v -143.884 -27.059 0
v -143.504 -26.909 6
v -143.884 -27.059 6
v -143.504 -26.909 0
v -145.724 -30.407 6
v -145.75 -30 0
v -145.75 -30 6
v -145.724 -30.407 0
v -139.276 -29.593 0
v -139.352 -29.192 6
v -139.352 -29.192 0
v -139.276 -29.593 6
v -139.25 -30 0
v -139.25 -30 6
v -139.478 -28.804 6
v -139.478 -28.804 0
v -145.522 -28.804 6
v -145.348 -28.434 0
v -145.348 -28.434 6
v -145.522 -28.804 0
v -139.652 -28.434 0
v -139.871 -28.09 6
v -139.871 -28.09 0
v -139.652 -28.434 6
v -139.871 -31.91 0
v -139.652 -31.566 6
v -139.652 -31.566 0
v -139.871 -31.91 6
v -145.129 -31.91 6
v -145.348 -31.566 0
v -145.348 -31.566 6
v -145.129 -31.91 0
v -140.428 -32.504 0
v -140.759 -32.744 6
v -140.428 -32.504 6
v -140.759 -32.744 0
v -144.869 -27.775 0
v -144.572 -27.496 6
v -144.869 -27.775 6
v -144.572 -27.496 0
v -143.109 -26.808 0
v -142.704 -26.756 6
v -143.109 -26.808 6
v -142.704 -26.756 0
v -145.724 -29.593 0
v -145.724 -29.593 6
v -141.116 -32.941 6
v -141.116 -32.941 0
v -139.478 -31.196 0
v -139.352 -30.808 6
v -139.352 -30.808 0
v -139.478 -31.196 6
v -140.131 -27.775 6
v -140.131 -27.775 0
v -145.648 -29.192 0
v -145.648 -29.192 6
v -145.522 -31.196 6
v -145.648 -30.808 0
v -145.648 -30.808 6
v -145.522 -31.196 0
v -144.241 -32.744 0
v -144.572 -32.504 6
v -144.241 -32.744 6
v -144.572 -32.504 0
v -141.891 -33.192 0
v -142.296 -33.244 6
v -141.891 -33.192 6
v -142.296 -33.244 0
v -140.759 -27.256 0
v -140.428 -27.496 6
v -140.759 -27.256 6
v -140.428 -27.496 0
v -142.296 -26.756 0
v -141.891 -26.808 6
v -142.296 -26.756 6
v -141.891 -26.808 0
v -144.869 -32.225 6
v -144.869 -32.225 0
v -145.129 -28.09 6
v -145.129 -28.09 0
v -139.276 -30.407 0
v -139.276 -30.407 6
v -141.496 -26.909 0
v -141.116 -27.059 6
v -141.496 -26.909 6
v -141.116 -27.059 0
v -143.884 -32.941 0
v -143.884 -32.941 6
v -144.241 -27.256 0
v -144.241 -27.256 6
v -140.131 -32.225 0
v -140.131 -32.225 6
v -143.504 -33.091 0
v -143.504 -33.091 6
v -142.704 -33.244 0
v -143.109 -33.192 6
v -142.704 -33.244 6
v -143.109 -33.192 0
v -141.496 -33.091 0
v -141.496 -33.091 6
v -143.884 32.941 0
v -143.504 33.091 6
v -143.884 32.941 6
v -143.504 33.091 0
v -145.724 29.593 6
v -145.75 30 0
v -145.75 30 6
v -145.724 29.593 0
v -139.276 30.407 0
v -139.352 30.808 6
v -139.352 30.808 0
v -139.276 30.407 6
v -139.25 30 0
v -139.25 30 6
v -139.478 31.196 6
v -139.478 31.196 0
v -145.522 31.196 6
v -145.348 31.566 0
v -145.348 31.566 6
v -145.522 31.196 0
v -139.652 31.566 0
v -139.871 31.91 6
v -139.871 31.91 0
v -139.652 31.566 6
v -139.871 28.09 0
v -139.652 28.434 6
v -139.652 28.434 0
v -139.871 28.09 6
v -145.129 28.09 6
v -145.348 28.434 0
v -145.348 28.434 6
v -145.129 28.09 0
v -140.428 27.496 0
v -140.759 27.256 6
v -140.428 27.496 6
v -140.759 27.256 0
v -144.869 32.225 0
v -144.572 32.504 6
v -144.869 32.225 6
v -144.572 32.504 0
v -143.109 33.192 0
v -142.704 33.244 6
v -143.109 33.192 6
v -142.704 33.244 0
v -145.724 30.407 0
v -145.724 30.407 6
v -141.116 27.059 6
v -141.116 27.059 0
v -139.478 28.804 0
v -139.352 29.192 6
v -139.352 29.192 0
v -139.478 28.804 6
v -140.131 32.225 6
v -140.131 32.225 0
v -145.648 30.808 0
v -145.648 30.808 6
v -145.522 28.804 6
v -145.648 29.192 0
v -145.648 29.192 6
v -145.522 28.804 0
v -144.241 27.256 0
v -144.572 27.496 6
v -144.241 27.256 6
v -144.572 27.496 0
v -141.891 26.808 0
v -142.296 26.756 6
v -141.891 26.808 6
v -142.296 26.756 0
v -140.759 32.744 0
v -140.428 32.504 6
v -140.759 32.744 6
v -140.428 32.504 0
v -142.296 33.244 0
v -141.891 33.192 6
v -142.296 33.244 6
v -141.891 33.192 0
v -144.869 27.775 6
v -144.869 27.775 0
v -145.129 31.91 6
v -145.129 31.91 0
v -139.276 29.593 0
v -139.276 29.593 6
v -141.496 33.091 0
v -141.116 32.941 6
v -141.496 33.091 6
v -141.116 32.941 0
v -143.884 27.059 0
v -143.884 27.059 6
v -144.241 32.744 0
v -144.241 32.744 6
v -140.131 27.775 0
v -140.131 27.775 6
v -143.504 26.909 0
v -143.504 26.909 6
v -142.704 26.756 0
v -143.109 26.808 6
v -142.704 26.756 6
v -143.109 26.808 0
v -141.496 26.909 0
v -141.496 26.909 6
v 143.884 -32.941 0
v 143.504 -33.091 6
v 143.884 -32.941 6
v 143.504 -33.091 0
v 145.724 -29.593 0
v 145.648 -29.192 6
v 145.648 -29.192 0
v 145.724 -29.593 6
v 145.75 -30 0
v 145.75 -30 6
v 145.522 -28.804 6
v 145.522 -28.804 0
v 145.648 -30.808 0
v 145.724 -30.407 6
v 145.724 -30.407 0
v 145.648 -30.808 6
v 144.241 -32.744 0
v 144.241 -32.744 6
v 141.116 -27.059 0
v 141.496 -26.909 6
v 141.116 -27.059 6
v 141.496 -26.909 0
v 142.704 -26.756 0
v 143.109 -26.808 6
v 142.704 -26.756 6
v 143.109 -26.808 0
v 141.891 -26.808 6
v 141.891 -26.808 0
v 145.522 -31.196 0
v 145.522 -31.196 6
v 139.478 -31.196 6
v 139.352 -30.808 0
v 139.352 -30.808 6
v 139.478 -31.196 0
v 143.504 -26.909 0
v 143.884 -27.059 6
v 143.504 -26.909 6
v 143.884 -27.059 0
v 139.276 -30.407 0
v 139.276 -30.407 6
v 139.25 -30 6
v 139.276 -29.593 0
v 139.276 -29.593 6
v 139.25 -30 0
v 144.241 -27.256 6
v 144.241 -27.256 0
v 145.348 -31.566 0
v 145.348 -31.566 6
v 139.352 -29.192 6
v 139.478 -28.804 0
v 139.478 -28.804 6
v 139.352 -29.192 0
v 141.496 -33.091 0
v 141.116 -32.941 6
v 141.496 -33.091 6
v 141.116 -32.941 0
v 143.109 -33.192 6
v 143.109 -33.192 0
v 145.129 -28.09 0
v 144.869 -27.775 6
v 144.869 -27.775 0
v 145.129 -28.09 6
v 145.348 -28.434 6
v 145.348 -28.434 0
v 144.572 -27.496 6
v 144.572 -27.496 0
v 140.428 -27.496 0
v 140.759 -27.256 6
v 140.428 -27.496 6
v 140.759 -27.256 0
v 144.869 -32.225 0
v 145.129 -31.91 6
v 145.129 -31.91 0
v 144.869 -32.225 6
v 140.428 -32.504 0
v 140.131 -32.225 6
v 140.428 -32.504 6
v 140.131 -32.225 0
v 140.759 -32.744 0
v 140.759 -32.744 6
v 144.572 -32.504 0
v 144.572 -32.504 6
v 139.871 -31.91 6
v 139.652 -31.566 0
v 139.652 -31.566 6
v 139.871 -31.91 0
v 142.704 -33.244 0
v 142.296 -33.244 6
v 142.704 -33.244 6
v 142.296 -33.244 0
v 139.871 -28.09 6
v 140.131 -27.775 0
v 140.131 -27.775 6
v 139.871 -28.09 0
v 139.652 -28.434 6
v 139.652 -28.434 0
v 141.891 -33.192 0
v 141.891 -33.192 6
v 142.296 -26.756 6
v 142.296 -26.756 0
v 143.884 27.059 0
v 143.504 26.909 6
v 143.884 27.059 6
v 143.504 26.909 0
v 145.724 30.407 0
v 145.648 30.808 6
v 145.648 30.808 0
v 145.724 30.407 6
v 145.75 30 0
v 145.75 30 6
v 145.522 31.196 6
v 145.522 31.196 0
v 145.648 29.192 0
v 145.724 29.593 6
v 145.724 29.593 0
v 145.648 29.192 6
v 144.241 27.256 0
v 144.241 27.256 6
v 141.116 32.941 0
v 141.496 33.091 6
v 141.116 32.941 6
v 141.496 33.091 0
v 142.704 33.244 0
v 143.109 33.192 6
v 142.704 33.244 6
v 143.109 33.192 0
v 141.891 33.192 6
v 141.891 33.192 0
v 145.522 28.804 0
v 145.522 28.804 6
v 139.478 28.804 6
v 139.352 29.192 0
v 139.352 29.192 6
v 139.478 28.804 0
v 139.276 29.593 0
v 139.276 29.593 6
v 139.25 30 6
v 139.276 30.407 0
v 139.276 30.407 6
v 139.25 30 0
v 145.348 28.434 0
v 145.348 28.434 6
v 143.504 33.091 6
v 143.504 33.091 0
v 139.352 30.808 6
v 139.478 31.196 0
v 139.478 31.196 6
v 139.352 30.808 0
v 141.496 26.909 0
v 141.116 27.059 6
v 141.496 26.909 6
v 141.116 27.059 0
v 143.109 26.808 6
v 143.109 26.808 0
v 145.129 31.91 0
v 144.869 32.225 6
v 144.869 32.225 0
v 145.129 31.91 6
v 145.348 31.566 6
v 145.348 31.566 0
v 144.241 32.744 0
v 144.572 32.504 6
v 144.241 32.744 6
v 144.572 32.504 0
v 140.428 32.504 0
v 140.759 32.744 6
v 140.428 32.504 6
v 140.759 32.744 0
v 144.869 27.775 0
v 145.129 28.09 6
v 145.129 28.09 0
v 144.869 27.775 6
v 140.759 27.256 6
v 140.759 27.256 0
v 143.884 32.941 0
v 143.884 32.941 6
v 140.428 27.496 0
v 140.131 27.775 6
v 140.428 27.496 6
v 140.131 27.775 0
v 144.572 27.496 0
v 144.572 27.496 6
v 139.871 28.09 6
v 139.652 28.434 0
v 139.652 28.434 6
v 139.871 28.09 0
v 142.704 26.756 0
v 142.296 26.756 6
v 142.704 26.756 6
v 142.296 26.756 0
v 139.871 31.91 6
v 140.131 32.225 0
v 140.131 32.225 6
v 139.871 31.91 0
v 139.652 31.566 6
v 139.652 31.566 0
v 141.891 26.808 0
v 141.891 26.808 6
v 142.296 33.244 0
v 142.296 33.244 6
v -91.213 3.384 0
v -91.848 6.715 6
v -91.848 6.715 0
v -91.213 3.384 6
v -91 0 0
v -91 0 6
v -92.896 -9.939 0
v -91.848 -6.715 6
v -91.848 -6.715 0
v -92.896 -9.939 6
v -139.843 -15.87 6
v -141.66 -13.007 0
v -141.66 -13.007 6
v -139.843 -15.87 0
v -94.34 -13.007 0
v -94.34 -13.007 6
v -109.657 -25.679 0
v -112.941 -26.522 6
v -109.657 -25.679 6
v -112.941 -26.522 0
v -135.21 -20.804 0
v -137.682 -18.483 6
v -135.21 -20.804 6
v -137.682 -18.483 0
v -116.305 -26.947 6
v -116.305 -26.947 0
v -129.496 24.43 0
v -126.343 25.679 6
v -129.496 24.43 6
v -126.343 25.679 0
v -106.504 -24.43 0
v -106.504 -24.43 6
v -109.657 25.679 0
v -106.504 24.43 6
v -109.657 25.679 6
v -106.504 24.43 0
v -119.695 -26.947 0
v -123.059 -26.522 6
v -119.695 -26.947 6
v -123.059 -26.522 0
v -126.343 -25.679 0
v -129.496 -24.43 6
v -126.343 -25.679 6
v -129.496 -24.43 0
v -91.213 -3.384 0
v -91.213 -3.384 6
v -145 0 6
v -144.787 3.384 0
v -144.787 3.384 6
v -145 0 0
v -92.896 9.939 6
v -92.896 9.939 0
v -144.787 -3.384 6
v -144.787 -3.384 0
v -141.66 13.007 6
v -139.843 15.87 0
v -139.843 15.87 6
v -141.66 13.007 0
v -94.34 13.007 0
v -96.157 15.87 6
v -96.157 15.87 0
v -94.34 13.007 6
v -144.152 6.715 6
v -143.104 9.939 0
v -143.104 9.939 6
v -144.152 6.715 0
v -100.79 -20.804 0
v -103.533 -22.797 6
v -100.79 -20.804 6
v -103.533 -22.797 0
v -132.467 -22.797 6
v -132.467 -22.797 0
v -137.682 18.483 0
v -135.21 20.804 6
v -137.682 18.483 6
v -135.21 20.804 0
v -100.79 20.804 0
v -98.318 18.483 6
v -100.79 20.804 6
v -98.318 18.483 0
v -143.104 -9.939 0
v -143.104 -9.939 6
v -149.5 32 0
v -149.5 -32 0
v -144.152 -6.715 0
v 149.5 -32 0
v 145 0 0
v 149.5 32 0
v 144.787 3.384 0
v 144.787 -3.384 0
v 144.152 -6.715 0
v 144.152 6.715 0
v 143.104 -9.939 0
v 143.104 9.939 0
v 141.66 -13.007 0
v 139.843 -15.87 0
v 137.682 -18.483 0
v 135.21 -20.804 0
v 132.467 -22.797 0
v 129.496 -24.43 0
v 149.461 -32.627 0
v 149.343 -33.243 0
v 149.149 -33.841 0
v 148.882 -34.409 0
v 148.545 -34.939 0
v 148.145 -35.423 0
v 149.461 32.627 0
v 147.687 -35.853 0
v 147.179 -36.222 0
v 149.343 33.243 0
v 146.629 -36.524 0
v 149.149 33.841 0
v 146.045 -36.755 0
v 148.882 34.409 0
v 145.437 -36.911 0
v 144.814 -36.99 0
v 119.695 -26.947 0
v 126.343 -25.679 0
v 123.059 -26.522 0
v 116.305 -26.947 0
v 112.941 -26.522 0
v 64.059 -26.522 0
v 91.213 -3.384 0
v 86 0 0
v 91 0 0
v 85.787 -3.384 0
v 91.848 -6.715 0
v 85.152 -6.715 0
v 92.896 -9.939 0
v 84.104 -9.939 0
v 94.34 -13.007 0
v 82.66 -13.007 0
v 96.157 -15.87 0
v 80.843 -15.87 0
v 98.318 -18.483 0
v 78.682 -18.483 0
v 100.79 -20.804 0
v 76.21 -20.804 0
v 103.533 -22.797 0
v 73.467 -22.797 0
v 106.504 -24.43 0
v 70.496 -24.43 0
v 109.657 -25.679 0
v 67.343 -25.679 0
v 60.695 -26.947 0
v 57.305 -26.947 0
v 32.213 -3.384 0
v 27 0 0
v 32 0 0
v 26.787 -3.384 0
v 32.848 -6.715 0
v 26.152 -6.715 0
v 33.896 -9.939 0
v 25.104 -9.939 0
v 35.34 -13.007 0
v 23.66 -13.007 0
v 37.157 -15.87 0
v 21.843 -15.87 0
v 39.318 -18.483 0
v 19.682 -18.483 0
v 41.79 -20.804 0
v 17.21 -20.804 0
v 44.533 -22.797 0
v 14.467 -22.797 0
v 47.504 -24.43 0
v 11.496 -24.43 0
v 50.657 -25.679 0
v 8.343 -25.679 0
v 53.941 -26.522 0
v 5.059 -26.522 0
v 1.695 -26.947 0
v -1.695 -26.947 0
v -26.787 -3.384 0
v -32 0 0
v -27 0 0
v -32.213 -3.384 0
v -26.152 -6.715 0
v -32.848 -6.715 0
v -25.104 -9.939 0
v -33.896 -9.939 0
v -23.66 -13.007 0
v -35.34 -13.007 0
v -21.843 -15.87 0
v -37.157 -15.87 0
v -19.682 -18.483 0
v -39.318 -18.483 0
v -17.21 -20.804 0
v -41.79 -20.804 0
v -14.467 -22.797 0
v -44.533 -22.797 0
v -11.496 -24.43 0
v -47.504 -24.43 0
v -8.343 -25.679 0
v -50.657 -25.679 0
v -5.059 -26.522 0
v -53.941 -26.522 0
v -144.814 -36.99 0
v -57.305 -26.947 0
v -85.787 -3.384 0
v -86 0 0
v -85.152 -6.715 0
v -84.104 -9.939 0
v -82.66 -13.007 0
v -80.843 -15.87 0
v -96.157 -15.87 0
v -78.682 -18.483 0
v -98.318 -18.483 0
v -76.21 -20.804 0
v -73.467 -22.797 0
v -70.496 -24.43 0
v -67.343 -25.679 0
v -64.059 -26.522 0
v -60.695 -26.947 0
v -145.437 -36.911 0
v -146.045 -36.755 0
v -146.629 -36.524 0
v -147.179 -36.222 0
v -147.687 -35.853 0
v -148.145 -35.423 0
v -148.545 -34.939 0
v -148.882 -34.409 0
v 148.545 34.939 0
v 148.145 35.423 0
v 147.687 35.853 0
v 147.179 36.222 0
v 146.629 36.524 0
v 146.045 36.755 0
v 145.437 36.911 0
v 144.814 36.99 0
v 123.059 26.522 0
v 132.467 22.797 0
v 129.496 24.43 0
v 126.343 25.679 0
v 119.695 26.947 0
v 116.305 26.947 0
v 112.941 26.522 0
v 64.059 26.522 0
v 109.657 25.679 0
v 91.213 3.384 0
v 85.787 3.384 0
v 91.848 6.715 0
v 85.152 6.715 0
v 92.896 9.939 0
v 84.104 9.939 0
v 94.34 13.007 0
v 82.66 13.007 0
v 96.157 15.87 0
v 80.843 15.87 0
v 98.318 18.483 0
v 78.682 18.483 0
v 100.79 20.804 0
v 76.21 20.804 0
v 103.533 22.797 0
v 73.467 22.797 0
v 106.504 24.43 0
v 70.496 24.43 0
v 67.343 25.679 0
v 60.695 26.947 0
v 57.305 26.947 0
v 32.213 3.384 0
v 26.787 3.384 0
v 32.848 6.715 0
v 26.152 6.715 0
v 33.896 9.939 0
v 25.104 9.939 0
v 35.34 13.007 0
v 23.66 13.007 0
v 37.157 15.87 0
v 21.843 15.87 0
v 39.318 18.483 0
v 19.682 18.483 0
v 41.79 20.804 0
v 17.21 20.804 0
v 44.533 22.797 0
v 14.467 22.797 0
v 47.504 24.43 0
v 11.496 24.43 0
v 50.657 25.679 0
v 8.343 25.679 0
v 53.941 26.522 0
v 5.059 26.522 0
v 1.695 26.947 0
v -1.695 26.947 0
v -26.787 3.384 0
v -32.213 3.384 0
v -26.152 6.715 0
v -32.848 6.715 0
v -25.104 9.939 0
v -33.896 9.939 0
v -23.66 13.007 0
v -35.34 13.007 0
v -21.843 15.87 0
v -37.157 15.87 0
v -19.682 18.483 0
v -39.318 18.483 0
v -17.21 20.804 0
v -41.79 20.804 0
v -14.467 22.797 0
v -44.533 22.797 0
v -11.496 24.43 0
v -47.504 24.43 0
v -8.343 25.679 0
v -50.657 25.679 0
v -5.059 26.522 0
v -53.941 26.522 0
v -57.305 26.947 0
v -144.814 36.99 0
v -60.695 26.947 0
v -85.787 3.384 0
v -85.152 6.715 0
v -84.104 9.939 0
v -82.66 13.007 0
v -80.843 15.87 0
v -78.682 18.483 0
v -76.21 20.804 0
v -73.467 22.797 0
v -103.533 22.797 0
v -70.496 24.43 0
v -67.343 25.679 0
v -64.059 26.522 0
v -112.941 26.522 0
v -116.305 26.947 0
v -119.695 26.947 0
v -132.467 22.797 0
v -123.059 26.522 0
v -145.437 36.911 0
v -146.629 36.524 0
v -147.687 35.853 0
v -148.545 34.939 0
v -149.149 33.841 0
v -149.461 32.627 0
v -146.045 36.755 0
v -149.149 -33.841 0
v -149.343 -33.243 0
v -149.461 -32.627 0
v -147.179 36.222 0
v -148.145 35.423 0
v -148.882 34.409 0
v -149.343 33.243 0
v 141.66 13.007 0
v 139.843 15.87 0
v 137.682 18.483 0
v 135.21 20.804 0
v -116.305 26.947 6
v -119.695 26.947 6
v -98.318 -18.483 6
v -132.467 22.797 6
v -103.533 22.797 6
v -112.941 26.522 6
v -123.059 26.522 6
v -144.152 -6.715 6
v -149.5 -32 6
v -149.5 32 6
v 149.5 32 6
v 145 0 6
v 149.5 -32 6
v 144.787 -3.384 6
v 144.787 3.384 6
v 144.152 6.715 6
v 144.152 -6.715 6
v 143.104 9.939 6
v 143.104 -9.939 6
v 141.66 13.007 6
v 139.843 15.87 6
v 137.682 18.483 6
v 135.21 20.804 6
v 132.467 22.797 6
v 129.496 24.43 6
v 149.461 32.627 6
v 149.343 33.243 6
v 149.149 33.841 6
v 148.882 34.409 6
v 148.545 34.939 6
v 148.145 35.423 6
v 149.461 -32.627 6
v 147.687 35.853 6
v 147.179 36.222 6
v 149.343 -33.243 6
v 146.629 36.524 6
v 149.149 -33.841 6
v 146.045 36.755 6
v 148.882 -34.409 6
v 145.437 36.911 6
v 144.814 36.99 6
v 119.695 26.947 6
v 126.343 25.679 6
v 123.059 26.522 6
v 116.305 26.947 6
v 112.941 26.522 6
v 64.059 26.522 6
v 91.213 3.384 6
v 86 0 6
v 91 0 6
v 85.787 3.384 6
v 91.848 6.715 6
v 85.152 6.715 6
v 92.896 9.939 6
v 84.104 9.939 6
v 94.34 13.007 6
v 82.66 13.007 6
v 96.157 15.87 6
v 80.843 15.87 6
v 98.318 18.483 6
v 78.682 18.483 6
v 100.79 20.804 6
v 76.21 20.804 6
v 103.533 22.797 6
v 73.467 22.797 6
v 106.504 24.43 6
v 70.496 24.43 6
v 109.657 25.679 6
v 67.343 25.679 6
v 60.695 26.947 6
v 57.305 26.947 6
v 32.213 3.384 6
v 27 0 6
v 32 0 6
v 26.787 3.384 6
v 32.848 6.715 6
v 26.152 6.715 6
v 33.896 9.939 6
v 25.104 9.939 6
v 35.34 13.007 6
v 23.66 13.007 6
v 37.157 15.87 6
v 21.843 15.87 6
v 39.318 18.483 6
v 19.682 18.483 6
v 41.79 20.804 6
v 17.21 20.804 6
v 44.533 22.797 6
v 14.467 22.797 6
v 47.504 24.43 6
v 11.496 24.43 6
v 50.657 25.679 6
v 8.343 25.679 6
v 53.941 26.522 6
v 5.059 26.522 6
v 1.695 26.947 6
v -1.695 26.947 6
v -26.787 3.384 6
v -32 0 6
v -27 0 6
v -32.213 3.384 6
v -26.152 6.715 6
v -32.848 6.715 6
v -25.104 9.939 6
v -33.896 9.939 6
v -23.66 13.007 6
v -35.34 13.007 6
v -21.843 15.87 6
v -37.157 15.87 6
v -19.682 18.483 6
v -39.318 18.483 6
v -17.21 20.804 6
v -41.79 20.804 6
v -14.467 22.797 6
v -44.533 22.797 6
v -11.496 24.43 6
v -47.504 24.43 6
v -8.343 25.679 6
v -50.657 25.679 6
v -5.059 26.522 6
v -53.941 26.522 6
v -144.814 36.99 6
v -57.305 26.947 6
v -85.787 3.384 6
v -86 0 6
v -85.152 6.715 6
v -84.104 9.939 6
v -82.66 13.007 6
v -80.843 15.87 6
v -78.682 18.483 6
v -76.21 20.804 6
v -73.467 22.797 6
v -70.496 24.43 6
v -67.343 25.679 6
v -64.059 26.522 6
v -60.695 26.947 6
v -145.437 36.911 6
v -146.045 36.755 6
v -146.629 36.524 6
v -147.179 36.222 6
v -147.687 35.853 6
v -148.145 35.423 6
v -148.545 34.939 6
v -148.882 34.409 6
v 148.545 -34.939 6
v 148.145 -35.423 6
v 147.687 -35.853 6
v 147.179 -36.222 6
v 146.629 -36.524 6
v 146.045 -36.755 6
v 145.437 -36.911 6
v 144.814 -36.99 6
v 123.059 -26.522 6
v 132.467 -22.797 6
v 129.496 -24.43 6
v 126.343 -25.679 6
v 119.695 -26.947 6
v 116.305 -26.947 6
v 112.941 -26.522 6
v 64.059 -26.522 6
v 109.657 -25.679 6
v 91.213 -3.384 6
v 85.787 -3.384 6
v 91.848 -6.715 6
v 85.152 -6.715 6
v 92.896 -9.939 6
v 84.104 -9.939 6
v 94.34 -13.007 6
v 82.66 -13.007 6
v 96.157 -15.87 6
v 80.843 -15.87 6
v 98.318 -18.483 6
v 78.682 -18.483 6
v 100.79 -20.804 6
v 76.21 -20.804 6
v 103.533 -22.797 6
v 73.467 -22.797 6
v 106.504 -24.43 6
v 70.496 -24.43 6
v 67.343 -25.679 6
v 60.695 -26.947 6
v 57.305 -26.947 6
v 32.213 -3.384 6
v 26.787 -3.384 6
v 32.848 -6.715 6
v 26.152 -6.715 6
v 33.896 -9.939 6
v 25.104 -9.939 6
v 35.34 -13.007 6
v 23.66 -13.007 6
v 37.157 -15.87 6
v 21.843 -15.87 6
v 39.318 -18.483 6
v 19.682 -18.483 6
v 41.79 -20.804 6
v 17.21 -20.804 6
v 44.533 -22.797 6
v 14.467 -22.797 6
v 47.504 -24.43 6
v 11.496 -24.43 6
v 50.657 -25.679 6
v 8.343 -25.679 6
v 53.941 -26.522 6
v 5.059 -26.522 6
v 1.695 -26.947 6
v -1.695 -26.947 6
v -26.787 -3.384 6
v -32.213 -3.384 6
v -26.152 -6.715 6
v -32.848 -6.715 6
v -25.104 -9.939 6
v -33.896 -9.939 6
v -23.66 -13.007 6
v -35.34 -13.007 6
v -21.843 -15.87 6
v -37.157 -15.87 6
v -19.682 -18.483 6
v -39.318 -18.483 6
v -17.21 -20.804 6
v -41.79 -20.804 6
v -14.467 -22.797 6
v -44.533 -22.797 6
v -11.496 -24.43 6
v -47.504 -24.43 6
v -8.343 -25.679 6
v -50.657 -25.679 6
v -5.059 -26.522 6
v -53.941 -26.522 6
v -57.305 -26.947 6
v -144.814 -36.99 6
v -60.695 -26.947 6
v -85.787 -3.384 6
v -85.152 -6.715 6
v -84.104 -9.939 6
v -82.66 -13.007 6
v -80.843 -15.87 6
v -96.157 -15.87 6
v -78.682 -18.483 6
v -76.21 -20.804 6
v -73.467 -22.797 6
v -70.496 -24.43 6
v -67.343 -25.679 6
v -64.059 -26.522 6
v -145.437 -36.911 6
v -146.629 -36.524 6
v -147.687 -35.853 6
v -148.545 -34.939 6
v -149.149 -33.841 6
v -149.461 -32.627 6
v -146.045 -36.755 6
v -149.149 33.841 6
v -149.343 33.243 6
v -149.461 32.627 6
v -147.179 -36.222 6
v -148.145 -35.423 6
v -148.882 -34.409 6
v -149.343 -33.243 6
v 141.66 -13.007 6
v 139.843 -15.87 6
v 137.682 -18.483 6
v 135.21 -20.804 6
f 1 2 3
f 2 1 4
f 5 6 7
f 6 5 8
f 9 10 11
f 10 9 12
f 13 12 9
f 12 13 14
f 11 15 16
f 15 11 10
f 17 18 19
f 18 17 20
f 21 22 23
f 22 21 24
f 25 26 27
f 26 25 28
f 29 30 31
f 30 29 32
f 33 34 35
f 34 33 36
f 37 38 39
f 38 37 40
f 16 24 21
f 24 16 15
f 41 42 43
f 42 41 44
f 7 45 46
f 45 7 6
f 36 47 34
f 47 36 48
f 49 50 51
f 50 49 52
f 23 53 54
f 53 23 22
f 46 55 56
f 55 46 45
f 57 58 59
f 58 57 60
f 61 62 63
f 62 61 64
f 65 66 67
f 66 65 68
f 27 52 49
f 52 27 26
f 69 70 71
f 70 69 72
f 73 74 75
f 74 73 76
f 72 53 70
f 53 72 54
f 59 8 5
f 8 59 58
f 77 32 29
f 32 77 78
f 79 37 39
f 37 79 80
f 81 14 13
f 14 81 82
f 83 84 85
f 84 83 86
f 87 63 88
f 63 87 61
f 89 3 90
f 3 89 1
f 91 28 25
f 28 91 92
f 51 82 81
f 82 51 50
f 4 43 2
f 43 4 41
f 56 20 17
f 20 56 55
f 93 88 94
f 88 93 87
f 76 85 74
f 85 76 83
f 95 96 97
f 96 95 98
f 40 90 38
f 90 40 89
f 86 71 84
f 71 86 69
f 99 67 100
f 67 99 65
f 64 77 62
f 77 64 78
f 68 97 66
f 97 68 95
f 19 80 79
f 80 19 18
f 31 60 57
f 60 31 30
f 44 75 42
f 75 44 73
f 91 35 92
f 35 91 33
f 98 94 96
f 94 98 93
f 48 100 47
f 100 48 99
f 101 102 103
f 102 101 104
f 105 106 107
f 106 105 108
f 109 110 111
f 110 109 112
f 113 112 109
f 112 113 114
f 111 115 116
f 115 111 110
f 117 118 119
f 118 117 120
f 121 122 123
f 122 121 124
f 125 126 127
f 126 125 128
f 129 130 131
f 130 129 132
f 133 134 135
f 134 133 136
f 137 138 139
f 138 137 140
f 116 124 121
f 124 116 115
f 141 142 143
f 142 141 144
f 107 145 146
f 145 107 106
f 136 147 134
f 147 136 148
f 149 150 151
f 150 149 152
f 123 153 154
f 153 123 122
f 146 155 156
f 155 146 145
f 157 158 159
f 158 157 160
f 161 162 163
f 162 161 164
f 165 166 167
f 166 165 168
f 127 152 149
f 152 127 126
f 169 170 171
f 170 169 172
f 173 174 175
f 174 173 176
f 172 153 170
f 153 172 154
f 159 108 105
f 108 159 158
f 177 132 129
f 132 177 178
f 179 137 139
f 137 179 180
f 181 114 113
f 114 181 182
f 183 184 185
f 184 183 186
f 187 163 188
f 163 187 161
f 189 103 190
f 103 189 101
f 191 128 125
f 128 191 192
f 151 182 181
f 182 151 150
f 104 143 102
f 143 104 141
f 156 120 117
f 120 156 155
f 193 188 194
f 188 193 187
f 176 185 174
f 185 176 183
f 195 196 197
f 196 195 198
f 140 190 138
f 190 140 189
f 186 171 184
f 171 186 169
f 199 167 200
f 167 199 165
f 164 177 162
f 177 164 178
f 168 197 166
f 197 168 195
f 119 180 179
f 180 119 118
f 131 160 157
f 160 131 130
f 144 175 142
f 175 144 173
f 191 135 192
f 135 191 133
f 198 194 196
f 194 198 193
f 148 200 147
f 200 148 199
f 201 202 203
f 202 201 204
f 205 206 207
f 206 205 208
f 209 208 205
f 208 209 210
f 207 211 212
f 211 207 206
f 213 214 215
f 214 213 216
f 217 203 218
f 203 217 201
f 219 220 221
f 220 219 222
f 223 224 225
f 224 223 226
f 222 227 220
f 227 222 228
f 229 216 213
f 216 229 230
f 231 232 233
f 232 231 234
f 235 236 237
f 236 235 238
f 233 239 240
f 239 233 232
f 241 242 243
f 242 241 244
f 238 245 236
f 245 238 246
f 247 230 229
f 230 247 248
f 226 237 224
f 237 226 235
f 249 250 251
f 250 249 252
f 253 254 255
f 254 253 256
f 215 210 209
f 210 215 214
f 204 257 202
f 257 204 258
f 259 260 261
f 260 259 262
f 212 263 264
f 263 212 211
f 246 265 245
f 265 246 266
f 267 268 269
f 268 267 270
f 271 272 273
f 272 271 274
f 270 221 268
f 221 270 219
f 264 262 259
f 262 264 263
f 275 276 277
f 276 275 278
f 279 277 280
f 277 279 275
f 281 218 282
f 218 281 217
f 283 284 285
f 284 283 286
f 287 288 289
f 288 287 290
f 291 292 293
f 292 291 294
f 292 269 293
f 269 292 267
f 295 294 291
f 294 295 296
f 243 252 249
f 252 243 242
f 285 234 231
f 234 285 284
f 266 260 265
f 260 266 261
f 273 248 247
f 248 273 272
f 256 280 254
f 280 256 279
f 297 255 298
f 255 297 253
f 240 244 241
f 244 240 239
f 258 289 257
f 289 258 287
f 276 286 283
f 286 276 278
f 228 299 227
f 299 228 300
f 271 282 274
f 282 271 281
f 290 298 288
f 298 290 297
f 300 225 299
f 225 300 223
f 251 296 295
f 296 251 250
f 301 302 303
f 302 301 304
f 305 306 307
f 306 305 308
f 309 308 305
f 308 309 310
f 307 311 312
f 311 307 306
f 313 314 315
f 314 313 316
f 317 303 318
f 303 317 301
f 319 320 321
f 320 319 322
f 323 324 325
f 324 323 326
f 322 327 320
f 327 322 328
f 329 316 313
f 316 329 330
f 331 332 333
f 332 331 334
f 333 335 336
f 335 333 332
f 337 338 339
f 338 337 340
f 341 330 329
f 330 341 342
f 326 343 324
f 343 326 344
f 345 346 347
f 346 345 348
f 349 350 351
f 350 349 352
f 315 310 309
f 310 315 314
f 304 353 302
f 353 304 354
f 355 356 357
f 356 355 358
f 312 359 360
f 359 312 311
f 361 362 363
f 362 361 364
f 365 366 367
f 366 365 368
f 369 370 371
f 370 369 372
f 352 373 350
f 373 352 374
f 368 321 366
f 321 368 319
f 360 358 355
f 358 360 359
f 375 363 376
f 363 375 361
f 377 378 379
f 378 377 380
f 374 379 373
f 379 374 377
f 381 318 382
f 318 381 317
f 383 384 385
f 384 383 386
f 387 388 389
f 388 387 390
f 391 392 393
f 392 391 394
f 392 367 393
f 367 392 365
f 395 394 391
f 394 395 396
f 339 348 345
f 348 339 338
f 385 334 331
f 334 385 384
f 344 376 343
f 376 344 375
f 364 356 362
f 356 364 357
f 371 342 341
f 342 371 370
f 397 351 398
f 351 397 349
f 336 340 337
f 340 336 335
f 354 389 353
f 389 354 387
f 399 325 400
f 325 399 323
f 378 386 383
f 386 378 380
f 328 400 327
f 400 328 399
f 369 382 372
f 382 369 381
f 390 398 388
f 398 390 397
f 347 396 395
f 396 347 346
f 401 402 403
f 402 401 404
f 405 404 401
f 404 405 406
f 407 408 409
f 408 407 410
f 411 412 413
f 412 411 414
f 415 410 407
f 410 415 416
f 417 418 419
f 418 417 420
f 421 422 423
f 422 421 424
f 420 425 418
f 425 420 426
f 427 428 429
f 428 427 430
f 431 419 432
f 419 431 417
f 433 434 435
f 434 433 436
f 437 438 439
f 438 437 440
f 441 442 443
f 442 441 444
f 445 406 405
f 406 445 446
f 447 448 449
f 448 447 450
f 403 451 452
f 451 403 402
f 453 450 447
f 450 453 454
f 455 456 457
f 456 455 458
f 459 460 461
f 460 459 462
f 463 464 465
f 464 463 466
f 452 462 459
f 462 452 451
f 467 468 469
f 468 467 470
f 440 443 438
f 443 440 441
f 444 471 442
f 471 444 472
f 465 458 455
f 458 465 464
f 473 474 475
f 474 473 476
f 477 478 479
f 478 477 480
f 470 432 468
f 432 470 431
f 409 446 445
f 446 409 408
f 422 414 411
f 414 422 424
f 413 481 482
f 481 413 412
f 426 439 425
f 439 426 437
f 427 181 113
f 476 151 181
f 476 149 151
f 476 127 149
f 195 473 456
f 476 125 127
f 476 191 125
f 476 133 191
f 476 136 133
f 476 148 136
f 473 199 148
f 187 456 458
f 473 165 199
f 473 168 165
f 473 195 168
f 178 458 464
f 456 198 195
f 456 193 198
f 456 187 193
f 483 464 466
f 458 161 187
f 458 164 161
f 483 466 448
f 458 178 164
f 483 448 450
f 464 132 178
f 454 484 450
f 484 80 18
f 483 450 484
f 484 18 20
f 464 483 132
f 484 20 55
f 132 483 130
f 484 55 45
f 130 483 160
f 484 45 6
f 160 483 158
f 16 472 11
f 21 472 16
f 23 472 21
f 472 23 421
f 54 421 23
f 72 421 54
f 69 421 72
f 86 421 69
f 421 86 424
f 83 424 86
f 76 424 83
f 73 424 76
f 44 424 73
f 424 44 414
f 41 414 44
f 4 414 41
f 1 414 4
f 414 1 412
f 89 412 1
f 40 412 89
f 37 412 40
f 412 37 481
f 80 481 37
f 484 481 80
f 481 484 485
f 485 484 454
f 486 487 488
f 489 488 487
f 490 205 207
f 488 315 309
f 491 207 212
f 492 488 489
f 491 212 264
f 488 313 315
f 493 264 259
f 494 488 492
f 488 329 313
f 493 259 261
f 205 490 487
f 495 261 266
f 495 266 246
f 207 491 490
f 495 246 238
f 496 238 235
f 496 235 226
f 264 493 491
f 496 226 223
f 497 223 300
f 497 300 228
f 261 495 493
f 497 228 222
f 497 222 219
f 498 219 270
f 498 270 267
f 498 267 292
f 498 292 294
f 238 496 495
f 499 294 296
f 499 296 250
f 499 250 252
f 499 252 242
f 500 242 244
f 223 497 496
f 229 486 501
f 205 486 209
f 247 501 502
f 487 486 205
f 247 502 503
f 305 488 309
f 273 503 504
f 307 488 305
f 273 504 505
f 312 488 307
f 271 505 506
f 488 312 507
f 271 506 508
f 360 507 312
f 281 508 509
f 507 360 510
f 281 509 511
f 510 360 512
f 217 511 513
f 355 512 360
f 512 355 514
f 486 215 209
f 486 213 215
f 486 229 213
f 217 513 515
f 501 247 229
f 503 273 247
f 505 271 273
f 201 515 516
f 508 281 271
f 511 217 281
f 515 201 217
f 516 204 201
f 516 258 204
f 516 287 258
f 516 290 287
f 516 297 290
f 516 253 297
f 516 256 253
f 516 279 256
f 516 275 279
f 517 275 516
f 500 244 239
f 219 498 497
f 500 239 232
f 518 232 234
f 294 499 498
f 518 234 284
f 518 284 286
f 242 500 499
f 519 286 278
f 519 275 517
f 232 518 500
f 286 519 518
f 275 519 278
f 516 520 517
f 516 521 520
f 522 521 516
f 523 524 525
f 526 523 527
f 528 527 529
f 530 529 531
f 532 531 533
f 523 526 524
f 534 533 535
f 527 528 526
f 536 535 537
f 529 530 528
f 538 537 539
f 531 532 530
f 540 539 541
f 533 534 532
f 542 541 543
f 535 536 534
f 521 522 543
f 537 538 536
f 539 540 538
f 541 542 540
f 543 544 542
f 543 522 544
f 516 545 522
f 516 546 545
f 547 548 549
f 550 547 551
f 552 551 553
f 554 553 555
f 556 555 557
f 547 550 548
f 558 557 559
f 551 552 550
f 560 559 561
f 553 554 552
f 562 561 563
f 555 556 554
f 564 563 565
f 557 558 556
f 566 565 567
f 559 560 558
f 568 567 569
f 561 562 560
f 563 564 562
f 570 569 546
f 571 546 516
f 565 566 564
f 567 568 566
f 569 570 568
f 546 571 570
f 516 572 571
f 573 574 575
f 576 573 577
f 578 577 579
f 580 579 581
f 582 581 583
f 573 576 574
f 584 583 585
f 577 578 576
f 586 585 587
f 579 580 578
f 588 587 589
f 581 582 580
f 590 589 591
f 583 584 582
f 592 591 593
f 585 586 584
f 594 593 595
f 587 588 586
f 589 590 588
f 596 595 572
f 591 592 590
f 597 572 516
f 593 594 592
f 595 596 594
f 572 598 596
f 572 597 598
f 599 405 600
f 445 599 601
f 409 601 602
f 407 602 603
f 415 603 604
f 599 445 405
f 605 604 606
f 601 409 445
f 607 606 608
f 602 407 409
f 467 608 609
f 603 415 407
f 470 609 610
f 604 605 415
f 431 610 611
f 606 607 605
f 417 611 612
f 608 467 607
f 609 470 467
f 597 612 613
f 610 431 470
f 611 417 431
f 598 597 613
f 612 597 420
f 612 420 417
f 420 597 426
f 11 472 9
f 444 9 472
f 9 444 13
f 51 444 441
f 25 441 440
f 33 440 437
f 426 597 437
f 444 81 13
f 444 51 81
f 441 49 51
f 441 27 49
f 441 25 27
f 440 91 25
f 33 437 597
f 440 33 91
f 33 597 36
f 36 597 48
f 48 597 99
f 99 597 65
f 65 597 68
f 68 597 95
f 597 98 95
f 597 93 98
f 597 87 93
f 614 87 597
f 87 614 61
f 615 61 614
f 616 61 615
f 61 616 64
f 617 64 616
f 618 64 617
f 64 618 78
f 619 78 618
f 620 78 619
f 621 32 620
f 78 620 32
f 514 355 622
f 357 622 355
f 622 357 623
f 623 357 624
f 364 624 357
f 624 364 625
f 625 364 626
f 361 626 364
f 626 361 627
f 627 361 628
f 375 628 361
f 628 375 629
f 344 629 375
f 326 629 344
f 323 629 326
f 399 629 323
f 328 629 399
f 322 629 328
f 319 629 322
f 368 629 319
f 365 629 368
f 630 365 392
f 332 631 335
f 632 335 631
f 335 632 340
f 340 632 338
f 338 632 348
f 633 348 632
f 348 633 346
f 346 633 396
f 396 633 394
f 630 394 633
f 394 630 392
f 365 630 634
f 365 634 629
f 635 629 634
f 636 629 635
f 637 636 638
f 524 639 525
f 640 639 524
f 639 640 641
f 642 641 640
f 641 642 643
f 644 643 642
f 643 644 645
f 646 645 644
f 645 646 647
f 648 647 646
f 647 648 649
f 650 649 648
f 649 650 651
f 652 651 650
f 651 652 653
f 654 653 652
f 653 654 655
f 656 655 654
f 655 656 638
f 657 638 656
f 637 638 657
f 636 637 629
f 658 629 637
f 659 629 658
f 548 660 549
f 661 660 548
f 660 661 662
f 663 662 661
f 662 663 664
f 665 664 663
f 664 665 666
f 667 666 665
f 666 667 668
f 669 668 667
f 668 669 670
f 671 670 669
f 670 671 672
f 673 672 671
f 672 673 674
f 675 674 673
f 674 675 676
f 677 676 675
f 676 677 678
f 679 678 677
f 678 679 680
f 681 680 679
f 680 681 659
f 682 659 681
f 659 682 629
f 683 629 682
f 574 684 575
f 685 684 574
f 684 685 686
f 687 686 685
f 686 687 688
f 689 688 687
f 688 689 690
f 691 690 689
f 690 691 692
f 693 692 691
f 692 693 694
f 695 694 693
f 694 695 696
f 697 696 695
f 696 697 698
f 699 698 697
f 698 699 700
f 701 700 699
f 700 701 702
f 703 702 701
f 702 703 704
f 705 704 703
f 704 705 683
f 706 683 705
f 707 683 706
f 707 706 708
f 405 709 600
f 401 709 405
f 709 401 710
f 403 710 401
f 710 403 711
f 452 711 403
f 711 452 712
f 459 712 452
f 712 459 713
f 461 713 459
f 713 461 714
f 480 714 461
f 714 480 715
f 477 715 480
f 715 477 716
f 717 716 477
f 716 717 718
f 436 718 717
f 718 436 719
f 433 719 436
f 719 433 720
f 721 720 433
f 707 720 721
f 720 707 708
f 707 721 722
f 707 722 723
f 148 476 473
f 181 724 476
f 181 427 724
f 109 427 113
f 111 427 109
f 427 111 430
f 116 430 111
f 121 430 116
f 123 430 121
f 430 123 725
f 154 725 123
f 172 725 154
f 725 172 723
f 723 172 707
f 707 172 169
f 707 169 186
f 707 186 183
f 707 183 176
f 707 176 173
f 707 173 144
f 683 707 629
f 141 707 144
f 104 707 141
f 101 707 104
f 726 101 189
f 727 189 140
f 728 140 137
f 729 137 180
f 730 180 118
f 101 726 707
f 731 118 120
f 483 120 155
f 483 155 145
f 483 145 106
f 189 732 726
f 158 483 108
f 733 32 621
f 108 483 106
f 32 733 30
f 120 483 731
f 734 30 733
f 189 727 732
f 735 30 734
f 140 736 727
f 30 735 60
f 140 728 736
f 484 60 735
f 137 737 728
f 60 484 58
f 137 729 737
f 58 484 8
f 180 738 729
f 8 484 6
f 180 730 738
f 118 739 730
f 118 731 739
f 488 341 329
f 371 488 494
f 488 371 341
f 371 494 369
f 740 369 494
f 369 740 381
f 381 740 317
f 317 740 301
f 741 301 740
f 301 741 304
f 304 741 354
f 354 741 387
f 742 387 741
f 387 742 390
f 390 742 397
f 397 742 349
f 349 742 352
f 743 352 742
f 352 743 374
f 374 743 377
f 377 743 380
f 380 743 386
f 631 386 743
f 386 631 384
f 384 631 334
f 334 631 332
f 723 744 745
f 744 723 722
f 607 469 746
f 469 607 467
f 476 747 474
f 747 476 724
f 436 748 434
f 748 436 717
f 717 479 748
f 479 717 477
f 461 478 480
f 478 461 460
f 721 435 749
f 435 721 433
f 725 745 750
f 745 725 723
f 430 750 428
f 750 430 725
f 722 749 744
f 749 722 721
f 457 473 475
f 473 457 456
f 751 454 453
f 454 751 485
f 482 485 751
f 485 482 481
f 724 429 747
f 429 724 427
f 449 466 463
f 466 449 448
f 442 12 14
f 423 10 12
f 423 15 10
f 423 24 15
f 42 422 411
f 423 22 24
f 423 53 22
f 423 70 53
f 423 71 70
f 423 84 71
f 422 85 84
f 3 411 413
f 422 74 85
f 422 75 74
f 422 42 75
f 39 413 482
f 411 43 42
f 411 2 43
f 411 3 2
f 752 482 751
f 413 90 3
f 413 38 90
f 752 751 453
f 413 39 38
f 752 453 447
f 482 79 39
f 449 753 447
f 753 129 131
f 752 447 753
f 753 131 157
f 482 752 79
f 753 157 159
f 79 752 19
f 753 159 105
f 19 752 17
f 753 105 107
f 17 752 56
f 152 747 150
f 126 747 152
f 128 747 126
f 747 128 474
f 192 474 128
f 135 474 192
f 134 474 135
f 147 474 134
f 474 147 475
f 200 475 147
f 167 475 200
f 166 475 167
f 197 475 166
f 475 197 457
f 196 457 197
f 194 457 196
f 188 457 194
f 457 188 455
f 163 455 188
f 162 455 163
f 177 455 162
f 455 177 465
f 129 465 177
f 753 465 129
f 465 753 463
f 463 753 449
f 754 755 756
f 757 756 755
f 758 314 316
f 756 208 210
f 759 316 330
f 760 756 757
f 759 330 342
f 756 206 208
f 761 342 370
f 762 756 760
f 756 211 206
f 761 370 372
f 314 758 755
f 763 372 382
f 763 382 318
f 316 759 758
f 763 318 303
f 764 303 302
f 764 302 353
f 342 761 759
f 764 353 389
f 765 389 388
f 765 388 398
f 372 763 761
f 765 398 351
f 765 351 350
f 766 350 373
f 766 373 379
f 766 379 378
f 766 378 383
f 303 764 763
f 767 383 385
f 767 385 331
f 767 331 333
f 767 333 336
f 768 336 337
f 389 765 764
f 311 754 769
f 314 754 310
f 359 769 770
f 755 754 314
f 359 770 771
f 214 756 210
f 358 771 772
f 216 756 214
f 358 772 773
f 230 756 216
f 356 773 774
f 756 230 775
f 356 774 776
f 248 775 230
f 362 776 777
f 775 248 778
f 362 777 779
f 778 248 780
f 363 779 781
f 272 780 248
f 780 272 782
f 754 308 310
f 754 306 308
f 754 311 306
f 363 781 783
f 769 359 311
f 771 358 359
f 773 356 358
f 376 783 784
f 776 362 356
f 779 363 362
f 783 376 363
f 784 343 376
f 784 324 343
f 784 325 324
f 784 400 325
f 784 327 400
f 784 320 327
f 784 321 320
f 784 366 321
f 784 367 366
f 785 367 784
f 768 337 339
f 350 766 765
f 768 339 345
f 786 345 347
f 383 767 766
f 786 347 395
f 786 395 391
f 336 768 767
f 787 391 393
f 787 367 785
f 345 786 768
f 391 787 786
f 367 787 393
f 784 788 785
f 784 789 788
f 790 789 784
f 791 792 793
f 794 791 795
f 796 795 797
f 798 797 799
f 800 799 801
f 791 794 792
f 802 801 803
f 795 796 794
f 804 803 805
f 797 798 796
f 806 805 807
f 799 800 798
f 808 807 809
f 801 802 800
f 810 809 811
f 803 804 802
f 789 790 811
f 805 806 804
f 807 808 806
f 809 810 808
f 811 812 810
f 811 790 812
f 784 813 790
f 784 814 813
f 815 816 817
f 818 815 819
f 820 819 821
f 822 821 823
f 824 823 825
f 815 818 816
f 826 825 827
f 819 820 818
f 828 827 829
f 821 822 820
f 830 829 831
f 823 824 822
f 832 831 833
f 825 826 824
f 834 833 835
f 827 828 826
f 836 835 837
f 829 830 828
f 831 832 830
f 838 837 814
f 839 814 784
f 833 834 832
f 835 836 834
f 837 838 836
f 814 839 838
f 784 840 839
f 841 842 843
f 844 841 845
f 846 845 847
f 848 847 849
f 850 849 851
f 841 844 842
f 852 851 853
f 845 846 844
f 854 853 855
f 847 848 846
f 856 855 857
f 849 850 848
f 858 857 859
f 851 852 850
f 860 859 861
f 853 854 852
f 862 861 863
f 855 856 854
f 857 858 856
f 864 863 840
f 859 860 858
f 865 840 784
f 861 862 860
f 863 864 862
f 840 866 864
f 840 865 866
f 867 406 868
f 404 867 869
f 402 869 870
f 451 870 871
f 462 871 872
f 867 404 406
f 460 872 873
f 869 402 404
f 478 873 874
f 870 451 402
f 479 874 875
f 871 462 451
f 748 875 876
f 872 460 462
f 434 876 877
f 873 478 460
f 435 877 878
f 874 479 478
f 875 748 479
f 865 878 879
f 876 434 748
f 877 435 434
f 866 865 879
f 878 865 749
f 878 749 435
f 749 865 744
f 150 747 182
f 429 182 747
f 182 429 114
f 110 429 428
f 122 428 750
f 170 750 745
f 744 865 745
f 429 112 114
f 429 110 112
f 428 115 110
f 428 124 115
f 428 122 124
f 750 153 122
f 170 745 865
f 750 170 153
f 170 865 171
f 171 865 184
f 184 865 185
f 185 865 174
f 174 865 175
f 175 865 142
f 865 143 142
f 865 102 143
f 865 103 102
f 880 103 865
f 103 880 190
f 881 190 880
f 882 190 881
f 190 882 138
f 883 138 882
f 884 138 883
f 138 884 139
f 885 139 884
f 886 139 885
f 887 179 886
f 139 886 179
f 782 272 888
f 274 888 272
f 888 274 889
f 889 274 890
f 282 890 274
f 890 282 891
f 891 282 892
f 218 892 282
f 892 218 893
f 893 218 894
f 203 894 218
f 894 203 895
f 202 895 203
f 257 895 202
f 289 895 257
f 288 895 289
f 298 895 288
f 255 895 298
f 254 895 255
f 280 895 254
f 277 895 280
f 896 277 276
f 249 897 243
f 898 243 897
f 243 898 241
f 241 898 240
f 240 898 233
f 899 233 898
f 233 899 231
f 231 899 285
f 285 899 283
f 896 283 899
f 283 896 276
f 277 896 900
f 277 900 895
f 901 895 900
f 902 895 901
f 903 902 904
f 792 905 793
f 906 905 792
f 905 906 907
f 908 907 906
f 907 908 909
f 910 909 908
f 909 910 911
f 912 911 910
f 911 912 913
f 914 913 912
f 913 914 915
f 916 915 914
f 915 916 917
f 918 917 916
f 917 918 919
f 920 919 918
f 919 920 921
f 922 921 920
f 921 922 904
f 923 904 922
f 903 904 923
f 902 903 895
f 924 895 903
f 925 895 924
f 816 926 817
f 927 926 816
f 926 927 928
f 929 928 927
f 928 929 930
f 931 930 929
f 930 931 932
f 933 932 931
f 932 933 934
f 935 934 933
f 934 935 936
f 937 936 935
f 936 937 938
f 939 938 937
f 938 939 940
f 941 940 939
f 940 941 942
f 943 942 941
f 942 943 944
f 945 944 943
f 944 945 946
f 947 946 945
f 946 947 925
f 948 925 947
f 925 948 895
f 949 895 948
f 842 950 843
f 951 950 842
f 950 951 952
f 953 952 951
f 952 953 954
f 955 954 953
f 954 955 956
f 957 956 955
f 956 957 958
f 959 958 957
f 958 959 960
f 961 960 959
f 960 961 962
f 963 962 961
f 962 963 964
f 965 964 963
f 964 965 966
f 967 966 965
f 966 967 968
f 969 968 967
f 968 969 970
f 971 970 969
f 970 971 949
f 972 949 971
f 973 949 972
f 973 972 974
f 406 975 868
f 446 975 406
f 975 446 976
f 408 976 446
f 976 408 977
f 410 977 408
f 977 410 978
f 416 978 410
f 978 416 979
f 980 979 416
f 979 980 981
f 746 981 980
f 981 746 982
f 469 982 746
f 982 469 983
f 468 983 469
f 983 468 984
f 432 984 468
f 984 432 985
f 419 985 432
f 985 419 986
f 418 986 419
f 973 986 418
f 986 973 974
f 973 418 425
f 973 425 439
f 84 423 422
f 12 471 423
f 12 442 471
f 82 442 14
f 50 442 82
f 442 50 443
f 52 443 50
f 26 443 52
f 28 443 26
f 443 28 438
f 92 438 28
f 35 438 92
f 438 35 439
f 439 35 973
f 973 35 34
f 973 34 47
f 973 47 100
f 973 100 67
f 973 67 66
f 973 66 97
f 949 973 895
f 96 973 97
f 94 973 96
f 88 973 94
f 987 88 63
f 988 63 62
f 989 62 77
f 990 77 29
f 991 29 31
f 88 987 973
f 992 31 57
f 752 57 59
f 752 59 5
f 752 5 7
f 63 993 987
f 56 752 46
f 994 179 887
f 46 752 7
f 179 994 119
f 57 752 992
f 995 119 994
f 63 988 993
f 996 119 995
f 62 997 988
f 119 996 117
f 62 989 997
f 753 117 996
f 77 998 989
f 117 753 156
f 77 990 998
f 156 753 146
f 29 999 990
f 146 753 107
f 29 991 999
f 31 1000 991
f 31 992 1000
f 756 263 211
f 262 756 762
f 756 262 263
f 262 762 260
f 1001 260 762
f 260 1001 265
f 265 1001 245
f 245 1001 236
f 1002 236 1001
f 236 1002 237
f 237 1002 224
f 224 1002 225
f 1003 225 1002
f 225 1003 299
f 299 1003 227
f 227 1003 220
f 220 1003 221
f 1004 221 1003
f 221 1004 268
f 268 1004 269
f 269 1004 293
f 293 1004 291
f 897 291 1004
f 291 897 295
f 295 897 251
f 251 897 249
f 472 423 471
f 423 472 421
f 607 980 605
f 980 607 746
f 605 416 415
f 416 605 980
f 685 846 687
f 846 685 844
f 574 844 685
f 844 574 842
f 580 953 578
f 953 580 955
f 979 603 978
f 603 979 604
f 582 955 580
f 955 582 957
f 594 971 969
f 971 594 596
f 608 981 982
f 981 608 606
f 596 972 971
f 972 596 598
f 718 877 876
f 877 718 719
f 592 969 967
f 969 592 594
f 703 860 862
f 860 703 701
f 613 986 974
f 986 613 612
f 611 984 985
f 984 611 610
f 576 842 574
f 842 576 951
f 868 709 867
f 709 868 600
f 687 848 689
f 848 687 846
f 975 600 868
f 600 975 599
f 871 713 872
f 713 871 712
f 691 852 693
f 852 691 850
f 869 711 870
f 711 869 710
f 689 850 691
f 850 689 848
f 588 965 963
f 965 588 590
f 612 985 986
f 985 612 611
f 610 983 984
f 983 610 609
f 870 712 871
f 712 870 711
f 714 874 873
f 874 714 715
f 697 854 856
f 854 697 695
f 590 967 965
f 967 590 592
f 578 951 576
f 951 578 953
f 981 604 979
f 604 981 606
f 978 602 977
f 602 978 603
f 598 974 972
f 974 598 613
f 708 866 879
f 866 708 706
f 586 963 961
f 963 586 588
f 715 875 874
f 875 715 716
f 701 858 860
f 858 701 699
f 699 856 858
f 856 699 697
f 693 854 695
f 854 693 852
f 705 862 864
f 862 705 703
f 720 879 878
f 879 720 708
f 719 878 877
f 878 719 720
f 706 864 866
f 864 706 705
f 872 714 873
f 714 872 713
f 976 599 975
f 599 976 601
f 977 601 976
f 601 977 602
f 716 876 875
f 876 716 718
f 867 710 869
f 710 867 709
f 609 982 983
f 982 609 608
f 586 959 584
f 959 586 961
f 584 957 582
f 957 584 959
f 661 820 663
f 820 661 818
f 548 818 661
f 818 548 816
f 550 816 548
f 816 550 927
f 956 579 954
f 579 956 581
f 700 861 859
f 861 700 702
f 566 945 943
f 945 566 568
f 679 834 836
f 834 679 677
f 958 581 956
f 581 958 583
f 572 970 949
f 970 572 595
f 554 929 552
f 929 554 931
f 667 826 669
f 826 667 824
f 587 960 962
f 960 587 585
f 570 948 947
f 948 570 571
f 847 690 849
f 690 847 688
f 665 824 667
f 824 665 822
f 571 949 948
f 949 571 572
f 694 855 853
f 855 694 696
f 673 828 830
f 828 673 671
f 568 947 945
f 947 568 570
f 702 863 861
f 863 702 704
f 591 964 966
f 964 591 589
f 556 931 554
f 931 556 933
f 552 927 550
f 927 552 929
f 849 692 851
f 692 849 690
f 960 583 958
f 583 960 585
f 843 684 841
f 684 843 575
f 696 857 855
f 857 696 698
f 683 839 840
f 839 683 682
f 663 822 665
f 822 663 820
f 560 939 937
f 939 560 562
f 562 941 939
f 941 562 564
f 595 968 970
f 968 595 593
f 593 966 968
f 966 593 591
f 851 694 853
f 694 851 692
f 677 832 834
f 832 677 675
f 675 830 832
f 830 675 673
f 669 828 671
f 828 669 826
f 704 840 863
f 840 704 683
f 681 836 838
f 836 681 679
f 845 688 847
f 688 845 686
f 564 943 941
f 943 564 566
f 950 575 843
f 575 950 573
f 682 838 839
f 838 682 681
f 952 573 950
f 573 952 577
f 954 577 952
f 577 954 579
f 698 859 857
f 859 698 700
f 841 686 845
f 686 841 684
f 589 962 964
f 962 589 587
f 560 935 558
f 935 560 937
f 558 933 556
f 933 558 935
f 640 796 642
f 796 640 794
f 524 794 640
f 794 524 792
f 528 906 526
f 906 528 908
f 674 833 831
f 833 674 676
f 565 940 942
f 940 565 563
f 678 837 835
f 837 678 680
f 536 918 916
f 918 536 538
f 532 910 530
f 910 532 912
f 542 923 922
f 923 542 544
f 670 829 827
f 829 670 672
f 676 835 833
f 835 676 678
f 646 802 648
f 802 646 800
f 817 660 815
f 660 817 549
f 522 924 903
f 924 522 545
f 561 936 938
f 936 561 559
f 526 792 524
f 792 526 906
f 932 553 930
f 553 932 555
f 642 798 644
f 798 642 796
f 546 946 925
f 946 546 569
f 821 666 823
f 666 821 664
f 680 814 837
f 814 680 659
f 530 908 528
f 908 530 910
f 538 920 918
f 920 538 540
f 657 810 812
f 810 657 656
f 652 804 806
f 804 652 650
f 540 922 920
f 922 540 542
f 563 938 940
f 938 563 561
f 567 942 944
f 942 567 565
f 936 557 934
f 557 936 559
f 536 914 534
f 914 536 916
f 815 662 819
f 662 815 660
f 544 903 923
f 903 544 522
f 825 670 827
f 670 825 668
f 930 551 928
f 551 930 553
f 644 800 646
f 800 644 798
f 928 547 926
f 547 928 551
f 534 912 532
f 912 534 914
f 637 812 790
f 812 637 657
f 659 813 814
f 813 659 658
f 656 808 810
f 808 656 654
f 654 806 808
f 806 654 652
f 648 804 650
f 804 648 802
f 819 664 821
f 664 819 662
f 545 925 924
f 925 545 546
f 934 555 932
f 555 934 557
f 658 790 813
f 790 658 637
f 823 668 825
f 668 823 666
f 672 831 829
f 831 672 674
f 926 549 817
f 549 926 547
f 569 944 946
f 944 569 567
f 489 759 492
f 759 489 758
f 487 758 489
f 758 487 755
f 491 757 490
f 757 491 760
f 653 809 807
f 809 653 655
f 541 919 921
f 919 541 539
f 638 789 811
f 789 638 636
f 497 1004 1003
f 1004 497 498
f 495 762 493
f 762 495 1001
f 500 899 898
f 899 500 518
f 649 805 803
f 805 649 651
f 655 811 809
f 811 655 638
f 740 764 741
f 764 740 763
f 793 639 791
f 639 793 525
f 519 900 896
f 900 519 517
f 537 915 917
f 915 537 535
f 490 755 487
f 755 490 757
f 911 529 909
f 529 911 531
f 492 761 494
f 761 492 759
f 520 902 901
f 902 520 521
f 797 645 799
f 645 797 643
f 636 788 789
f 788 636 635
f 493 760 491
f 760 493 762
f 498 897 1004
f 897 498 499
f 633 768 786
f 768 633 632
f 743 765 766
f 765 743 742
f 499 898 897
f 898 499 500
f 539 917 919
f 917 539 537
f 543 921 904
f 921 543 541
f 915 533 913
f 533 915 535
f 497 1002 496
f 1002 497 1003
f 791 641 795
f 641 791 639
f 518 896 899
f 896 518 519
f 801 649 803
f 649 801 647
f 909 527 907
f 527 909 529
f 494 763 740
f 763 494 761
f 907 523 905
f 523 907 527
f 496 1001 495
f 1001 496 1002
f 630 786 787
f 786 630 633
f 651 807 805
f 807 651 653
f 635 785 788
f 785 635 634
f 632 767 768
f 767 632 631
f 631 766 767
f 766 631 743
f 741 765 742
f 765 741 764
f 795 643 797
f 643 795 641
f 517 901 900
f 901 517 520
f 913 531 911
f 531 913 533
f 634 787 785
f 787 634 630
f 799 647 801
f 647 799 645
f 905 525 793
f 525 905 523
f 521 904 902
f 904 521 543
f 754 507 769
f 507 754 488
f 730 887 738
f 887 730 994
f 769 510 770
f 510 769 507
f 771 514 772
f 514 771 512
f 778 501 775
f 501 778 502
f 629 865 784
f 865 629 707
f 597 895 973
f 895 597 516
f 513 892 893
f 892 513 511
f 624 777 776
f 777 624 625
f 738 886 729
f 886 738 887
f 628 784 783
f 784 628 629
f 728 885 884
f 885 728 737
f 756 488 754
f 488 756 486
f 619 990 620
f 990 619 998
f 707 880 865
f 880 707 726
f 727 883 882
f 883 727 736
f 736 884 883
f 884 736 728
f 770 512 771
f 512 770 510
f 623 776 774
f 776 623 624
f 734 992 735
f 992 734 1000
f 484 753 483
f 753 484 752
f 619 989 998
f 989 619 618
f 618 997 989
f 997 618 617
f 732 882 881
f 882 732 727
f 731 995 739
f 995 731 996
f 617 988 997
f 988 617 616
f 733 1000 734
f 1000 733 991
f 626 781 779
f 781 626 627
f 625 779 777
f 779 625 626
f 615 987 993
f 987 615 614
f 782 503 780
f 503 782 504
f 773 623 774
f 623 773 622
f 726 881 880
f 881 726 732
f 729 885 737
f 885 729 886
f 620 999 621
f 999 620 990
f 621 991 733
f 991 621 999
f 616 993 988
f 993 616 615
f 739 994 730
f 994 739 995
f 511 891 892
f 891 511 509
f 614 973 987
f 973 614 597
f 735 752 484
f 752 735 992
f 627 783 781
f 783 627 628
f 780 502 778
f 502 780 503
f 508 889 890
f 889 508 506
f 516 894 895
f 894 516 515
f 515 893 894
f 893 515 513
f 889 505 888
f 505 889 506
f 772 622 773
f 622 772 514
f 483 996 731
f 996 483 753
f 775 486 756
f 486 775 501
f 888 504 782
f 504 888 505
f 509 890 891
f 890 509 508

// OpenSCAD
$fn = 50;


difference() {
	union() {
		hull() {
			translate(v = [-144.5000000000, 32.0000000000, 0]) {
				cylinder(h = 6, r = 5);
			}
			translate(v = [144.5000000000, 32.0000000000, 0]) {
				cylinder(h = 6, r = 5);
			}
			translate(v = [-144.5000000000, -32.0000000000, 0]) {
				cylinder(h = 6, r = 5);
			}
			translate(v = [144.5000000000, -32.0000000000, 0]) {
				cylinder(h = 6, r = 5);
			}
		}
	}
	union() {
		#translate(v = [-142.5000000000, -30.0000000000, -100.0000000000]) {
			cylinder(h = 200, r = 3.2500000000);
		}
		#translate(v = [-142.5000000000, 30.0000000000, -100.0000000000]) {
			cylinder(h = 200, r = 3.2500000000);
		}
		#translate(v = [142.5000000000, -30.0000000000, -100.0000000000]) {
			cylinder(h = 200, r = 3.2500000000);
		}
		#translate(v = [142.5000000000, 30.0000000000, -100.0000000000]) {
			cylinder(h = 200, r = 3.2500000000);
		}
		#translate(v = [-118.0000000000, 0, 0]) {
			cylinder(h = 6, r = 27.0000000000);
		}
		#translate(v = [-59.0000000000, 0, 0]) {
			cylinder(h = 6, r = 27.0000000000);
		}
		#cylinder(h = 6, r = 27.0000000000);
		#translate(v = [59.0000000000, 0, 0]) {
			cylinder(h = 6, r = 27.0000000000);
		}
		#translate(v = [118.0000000000, 0, 0]) {
			cylinder(h = 6, r = 27.0000000000);
		}
	}
}
